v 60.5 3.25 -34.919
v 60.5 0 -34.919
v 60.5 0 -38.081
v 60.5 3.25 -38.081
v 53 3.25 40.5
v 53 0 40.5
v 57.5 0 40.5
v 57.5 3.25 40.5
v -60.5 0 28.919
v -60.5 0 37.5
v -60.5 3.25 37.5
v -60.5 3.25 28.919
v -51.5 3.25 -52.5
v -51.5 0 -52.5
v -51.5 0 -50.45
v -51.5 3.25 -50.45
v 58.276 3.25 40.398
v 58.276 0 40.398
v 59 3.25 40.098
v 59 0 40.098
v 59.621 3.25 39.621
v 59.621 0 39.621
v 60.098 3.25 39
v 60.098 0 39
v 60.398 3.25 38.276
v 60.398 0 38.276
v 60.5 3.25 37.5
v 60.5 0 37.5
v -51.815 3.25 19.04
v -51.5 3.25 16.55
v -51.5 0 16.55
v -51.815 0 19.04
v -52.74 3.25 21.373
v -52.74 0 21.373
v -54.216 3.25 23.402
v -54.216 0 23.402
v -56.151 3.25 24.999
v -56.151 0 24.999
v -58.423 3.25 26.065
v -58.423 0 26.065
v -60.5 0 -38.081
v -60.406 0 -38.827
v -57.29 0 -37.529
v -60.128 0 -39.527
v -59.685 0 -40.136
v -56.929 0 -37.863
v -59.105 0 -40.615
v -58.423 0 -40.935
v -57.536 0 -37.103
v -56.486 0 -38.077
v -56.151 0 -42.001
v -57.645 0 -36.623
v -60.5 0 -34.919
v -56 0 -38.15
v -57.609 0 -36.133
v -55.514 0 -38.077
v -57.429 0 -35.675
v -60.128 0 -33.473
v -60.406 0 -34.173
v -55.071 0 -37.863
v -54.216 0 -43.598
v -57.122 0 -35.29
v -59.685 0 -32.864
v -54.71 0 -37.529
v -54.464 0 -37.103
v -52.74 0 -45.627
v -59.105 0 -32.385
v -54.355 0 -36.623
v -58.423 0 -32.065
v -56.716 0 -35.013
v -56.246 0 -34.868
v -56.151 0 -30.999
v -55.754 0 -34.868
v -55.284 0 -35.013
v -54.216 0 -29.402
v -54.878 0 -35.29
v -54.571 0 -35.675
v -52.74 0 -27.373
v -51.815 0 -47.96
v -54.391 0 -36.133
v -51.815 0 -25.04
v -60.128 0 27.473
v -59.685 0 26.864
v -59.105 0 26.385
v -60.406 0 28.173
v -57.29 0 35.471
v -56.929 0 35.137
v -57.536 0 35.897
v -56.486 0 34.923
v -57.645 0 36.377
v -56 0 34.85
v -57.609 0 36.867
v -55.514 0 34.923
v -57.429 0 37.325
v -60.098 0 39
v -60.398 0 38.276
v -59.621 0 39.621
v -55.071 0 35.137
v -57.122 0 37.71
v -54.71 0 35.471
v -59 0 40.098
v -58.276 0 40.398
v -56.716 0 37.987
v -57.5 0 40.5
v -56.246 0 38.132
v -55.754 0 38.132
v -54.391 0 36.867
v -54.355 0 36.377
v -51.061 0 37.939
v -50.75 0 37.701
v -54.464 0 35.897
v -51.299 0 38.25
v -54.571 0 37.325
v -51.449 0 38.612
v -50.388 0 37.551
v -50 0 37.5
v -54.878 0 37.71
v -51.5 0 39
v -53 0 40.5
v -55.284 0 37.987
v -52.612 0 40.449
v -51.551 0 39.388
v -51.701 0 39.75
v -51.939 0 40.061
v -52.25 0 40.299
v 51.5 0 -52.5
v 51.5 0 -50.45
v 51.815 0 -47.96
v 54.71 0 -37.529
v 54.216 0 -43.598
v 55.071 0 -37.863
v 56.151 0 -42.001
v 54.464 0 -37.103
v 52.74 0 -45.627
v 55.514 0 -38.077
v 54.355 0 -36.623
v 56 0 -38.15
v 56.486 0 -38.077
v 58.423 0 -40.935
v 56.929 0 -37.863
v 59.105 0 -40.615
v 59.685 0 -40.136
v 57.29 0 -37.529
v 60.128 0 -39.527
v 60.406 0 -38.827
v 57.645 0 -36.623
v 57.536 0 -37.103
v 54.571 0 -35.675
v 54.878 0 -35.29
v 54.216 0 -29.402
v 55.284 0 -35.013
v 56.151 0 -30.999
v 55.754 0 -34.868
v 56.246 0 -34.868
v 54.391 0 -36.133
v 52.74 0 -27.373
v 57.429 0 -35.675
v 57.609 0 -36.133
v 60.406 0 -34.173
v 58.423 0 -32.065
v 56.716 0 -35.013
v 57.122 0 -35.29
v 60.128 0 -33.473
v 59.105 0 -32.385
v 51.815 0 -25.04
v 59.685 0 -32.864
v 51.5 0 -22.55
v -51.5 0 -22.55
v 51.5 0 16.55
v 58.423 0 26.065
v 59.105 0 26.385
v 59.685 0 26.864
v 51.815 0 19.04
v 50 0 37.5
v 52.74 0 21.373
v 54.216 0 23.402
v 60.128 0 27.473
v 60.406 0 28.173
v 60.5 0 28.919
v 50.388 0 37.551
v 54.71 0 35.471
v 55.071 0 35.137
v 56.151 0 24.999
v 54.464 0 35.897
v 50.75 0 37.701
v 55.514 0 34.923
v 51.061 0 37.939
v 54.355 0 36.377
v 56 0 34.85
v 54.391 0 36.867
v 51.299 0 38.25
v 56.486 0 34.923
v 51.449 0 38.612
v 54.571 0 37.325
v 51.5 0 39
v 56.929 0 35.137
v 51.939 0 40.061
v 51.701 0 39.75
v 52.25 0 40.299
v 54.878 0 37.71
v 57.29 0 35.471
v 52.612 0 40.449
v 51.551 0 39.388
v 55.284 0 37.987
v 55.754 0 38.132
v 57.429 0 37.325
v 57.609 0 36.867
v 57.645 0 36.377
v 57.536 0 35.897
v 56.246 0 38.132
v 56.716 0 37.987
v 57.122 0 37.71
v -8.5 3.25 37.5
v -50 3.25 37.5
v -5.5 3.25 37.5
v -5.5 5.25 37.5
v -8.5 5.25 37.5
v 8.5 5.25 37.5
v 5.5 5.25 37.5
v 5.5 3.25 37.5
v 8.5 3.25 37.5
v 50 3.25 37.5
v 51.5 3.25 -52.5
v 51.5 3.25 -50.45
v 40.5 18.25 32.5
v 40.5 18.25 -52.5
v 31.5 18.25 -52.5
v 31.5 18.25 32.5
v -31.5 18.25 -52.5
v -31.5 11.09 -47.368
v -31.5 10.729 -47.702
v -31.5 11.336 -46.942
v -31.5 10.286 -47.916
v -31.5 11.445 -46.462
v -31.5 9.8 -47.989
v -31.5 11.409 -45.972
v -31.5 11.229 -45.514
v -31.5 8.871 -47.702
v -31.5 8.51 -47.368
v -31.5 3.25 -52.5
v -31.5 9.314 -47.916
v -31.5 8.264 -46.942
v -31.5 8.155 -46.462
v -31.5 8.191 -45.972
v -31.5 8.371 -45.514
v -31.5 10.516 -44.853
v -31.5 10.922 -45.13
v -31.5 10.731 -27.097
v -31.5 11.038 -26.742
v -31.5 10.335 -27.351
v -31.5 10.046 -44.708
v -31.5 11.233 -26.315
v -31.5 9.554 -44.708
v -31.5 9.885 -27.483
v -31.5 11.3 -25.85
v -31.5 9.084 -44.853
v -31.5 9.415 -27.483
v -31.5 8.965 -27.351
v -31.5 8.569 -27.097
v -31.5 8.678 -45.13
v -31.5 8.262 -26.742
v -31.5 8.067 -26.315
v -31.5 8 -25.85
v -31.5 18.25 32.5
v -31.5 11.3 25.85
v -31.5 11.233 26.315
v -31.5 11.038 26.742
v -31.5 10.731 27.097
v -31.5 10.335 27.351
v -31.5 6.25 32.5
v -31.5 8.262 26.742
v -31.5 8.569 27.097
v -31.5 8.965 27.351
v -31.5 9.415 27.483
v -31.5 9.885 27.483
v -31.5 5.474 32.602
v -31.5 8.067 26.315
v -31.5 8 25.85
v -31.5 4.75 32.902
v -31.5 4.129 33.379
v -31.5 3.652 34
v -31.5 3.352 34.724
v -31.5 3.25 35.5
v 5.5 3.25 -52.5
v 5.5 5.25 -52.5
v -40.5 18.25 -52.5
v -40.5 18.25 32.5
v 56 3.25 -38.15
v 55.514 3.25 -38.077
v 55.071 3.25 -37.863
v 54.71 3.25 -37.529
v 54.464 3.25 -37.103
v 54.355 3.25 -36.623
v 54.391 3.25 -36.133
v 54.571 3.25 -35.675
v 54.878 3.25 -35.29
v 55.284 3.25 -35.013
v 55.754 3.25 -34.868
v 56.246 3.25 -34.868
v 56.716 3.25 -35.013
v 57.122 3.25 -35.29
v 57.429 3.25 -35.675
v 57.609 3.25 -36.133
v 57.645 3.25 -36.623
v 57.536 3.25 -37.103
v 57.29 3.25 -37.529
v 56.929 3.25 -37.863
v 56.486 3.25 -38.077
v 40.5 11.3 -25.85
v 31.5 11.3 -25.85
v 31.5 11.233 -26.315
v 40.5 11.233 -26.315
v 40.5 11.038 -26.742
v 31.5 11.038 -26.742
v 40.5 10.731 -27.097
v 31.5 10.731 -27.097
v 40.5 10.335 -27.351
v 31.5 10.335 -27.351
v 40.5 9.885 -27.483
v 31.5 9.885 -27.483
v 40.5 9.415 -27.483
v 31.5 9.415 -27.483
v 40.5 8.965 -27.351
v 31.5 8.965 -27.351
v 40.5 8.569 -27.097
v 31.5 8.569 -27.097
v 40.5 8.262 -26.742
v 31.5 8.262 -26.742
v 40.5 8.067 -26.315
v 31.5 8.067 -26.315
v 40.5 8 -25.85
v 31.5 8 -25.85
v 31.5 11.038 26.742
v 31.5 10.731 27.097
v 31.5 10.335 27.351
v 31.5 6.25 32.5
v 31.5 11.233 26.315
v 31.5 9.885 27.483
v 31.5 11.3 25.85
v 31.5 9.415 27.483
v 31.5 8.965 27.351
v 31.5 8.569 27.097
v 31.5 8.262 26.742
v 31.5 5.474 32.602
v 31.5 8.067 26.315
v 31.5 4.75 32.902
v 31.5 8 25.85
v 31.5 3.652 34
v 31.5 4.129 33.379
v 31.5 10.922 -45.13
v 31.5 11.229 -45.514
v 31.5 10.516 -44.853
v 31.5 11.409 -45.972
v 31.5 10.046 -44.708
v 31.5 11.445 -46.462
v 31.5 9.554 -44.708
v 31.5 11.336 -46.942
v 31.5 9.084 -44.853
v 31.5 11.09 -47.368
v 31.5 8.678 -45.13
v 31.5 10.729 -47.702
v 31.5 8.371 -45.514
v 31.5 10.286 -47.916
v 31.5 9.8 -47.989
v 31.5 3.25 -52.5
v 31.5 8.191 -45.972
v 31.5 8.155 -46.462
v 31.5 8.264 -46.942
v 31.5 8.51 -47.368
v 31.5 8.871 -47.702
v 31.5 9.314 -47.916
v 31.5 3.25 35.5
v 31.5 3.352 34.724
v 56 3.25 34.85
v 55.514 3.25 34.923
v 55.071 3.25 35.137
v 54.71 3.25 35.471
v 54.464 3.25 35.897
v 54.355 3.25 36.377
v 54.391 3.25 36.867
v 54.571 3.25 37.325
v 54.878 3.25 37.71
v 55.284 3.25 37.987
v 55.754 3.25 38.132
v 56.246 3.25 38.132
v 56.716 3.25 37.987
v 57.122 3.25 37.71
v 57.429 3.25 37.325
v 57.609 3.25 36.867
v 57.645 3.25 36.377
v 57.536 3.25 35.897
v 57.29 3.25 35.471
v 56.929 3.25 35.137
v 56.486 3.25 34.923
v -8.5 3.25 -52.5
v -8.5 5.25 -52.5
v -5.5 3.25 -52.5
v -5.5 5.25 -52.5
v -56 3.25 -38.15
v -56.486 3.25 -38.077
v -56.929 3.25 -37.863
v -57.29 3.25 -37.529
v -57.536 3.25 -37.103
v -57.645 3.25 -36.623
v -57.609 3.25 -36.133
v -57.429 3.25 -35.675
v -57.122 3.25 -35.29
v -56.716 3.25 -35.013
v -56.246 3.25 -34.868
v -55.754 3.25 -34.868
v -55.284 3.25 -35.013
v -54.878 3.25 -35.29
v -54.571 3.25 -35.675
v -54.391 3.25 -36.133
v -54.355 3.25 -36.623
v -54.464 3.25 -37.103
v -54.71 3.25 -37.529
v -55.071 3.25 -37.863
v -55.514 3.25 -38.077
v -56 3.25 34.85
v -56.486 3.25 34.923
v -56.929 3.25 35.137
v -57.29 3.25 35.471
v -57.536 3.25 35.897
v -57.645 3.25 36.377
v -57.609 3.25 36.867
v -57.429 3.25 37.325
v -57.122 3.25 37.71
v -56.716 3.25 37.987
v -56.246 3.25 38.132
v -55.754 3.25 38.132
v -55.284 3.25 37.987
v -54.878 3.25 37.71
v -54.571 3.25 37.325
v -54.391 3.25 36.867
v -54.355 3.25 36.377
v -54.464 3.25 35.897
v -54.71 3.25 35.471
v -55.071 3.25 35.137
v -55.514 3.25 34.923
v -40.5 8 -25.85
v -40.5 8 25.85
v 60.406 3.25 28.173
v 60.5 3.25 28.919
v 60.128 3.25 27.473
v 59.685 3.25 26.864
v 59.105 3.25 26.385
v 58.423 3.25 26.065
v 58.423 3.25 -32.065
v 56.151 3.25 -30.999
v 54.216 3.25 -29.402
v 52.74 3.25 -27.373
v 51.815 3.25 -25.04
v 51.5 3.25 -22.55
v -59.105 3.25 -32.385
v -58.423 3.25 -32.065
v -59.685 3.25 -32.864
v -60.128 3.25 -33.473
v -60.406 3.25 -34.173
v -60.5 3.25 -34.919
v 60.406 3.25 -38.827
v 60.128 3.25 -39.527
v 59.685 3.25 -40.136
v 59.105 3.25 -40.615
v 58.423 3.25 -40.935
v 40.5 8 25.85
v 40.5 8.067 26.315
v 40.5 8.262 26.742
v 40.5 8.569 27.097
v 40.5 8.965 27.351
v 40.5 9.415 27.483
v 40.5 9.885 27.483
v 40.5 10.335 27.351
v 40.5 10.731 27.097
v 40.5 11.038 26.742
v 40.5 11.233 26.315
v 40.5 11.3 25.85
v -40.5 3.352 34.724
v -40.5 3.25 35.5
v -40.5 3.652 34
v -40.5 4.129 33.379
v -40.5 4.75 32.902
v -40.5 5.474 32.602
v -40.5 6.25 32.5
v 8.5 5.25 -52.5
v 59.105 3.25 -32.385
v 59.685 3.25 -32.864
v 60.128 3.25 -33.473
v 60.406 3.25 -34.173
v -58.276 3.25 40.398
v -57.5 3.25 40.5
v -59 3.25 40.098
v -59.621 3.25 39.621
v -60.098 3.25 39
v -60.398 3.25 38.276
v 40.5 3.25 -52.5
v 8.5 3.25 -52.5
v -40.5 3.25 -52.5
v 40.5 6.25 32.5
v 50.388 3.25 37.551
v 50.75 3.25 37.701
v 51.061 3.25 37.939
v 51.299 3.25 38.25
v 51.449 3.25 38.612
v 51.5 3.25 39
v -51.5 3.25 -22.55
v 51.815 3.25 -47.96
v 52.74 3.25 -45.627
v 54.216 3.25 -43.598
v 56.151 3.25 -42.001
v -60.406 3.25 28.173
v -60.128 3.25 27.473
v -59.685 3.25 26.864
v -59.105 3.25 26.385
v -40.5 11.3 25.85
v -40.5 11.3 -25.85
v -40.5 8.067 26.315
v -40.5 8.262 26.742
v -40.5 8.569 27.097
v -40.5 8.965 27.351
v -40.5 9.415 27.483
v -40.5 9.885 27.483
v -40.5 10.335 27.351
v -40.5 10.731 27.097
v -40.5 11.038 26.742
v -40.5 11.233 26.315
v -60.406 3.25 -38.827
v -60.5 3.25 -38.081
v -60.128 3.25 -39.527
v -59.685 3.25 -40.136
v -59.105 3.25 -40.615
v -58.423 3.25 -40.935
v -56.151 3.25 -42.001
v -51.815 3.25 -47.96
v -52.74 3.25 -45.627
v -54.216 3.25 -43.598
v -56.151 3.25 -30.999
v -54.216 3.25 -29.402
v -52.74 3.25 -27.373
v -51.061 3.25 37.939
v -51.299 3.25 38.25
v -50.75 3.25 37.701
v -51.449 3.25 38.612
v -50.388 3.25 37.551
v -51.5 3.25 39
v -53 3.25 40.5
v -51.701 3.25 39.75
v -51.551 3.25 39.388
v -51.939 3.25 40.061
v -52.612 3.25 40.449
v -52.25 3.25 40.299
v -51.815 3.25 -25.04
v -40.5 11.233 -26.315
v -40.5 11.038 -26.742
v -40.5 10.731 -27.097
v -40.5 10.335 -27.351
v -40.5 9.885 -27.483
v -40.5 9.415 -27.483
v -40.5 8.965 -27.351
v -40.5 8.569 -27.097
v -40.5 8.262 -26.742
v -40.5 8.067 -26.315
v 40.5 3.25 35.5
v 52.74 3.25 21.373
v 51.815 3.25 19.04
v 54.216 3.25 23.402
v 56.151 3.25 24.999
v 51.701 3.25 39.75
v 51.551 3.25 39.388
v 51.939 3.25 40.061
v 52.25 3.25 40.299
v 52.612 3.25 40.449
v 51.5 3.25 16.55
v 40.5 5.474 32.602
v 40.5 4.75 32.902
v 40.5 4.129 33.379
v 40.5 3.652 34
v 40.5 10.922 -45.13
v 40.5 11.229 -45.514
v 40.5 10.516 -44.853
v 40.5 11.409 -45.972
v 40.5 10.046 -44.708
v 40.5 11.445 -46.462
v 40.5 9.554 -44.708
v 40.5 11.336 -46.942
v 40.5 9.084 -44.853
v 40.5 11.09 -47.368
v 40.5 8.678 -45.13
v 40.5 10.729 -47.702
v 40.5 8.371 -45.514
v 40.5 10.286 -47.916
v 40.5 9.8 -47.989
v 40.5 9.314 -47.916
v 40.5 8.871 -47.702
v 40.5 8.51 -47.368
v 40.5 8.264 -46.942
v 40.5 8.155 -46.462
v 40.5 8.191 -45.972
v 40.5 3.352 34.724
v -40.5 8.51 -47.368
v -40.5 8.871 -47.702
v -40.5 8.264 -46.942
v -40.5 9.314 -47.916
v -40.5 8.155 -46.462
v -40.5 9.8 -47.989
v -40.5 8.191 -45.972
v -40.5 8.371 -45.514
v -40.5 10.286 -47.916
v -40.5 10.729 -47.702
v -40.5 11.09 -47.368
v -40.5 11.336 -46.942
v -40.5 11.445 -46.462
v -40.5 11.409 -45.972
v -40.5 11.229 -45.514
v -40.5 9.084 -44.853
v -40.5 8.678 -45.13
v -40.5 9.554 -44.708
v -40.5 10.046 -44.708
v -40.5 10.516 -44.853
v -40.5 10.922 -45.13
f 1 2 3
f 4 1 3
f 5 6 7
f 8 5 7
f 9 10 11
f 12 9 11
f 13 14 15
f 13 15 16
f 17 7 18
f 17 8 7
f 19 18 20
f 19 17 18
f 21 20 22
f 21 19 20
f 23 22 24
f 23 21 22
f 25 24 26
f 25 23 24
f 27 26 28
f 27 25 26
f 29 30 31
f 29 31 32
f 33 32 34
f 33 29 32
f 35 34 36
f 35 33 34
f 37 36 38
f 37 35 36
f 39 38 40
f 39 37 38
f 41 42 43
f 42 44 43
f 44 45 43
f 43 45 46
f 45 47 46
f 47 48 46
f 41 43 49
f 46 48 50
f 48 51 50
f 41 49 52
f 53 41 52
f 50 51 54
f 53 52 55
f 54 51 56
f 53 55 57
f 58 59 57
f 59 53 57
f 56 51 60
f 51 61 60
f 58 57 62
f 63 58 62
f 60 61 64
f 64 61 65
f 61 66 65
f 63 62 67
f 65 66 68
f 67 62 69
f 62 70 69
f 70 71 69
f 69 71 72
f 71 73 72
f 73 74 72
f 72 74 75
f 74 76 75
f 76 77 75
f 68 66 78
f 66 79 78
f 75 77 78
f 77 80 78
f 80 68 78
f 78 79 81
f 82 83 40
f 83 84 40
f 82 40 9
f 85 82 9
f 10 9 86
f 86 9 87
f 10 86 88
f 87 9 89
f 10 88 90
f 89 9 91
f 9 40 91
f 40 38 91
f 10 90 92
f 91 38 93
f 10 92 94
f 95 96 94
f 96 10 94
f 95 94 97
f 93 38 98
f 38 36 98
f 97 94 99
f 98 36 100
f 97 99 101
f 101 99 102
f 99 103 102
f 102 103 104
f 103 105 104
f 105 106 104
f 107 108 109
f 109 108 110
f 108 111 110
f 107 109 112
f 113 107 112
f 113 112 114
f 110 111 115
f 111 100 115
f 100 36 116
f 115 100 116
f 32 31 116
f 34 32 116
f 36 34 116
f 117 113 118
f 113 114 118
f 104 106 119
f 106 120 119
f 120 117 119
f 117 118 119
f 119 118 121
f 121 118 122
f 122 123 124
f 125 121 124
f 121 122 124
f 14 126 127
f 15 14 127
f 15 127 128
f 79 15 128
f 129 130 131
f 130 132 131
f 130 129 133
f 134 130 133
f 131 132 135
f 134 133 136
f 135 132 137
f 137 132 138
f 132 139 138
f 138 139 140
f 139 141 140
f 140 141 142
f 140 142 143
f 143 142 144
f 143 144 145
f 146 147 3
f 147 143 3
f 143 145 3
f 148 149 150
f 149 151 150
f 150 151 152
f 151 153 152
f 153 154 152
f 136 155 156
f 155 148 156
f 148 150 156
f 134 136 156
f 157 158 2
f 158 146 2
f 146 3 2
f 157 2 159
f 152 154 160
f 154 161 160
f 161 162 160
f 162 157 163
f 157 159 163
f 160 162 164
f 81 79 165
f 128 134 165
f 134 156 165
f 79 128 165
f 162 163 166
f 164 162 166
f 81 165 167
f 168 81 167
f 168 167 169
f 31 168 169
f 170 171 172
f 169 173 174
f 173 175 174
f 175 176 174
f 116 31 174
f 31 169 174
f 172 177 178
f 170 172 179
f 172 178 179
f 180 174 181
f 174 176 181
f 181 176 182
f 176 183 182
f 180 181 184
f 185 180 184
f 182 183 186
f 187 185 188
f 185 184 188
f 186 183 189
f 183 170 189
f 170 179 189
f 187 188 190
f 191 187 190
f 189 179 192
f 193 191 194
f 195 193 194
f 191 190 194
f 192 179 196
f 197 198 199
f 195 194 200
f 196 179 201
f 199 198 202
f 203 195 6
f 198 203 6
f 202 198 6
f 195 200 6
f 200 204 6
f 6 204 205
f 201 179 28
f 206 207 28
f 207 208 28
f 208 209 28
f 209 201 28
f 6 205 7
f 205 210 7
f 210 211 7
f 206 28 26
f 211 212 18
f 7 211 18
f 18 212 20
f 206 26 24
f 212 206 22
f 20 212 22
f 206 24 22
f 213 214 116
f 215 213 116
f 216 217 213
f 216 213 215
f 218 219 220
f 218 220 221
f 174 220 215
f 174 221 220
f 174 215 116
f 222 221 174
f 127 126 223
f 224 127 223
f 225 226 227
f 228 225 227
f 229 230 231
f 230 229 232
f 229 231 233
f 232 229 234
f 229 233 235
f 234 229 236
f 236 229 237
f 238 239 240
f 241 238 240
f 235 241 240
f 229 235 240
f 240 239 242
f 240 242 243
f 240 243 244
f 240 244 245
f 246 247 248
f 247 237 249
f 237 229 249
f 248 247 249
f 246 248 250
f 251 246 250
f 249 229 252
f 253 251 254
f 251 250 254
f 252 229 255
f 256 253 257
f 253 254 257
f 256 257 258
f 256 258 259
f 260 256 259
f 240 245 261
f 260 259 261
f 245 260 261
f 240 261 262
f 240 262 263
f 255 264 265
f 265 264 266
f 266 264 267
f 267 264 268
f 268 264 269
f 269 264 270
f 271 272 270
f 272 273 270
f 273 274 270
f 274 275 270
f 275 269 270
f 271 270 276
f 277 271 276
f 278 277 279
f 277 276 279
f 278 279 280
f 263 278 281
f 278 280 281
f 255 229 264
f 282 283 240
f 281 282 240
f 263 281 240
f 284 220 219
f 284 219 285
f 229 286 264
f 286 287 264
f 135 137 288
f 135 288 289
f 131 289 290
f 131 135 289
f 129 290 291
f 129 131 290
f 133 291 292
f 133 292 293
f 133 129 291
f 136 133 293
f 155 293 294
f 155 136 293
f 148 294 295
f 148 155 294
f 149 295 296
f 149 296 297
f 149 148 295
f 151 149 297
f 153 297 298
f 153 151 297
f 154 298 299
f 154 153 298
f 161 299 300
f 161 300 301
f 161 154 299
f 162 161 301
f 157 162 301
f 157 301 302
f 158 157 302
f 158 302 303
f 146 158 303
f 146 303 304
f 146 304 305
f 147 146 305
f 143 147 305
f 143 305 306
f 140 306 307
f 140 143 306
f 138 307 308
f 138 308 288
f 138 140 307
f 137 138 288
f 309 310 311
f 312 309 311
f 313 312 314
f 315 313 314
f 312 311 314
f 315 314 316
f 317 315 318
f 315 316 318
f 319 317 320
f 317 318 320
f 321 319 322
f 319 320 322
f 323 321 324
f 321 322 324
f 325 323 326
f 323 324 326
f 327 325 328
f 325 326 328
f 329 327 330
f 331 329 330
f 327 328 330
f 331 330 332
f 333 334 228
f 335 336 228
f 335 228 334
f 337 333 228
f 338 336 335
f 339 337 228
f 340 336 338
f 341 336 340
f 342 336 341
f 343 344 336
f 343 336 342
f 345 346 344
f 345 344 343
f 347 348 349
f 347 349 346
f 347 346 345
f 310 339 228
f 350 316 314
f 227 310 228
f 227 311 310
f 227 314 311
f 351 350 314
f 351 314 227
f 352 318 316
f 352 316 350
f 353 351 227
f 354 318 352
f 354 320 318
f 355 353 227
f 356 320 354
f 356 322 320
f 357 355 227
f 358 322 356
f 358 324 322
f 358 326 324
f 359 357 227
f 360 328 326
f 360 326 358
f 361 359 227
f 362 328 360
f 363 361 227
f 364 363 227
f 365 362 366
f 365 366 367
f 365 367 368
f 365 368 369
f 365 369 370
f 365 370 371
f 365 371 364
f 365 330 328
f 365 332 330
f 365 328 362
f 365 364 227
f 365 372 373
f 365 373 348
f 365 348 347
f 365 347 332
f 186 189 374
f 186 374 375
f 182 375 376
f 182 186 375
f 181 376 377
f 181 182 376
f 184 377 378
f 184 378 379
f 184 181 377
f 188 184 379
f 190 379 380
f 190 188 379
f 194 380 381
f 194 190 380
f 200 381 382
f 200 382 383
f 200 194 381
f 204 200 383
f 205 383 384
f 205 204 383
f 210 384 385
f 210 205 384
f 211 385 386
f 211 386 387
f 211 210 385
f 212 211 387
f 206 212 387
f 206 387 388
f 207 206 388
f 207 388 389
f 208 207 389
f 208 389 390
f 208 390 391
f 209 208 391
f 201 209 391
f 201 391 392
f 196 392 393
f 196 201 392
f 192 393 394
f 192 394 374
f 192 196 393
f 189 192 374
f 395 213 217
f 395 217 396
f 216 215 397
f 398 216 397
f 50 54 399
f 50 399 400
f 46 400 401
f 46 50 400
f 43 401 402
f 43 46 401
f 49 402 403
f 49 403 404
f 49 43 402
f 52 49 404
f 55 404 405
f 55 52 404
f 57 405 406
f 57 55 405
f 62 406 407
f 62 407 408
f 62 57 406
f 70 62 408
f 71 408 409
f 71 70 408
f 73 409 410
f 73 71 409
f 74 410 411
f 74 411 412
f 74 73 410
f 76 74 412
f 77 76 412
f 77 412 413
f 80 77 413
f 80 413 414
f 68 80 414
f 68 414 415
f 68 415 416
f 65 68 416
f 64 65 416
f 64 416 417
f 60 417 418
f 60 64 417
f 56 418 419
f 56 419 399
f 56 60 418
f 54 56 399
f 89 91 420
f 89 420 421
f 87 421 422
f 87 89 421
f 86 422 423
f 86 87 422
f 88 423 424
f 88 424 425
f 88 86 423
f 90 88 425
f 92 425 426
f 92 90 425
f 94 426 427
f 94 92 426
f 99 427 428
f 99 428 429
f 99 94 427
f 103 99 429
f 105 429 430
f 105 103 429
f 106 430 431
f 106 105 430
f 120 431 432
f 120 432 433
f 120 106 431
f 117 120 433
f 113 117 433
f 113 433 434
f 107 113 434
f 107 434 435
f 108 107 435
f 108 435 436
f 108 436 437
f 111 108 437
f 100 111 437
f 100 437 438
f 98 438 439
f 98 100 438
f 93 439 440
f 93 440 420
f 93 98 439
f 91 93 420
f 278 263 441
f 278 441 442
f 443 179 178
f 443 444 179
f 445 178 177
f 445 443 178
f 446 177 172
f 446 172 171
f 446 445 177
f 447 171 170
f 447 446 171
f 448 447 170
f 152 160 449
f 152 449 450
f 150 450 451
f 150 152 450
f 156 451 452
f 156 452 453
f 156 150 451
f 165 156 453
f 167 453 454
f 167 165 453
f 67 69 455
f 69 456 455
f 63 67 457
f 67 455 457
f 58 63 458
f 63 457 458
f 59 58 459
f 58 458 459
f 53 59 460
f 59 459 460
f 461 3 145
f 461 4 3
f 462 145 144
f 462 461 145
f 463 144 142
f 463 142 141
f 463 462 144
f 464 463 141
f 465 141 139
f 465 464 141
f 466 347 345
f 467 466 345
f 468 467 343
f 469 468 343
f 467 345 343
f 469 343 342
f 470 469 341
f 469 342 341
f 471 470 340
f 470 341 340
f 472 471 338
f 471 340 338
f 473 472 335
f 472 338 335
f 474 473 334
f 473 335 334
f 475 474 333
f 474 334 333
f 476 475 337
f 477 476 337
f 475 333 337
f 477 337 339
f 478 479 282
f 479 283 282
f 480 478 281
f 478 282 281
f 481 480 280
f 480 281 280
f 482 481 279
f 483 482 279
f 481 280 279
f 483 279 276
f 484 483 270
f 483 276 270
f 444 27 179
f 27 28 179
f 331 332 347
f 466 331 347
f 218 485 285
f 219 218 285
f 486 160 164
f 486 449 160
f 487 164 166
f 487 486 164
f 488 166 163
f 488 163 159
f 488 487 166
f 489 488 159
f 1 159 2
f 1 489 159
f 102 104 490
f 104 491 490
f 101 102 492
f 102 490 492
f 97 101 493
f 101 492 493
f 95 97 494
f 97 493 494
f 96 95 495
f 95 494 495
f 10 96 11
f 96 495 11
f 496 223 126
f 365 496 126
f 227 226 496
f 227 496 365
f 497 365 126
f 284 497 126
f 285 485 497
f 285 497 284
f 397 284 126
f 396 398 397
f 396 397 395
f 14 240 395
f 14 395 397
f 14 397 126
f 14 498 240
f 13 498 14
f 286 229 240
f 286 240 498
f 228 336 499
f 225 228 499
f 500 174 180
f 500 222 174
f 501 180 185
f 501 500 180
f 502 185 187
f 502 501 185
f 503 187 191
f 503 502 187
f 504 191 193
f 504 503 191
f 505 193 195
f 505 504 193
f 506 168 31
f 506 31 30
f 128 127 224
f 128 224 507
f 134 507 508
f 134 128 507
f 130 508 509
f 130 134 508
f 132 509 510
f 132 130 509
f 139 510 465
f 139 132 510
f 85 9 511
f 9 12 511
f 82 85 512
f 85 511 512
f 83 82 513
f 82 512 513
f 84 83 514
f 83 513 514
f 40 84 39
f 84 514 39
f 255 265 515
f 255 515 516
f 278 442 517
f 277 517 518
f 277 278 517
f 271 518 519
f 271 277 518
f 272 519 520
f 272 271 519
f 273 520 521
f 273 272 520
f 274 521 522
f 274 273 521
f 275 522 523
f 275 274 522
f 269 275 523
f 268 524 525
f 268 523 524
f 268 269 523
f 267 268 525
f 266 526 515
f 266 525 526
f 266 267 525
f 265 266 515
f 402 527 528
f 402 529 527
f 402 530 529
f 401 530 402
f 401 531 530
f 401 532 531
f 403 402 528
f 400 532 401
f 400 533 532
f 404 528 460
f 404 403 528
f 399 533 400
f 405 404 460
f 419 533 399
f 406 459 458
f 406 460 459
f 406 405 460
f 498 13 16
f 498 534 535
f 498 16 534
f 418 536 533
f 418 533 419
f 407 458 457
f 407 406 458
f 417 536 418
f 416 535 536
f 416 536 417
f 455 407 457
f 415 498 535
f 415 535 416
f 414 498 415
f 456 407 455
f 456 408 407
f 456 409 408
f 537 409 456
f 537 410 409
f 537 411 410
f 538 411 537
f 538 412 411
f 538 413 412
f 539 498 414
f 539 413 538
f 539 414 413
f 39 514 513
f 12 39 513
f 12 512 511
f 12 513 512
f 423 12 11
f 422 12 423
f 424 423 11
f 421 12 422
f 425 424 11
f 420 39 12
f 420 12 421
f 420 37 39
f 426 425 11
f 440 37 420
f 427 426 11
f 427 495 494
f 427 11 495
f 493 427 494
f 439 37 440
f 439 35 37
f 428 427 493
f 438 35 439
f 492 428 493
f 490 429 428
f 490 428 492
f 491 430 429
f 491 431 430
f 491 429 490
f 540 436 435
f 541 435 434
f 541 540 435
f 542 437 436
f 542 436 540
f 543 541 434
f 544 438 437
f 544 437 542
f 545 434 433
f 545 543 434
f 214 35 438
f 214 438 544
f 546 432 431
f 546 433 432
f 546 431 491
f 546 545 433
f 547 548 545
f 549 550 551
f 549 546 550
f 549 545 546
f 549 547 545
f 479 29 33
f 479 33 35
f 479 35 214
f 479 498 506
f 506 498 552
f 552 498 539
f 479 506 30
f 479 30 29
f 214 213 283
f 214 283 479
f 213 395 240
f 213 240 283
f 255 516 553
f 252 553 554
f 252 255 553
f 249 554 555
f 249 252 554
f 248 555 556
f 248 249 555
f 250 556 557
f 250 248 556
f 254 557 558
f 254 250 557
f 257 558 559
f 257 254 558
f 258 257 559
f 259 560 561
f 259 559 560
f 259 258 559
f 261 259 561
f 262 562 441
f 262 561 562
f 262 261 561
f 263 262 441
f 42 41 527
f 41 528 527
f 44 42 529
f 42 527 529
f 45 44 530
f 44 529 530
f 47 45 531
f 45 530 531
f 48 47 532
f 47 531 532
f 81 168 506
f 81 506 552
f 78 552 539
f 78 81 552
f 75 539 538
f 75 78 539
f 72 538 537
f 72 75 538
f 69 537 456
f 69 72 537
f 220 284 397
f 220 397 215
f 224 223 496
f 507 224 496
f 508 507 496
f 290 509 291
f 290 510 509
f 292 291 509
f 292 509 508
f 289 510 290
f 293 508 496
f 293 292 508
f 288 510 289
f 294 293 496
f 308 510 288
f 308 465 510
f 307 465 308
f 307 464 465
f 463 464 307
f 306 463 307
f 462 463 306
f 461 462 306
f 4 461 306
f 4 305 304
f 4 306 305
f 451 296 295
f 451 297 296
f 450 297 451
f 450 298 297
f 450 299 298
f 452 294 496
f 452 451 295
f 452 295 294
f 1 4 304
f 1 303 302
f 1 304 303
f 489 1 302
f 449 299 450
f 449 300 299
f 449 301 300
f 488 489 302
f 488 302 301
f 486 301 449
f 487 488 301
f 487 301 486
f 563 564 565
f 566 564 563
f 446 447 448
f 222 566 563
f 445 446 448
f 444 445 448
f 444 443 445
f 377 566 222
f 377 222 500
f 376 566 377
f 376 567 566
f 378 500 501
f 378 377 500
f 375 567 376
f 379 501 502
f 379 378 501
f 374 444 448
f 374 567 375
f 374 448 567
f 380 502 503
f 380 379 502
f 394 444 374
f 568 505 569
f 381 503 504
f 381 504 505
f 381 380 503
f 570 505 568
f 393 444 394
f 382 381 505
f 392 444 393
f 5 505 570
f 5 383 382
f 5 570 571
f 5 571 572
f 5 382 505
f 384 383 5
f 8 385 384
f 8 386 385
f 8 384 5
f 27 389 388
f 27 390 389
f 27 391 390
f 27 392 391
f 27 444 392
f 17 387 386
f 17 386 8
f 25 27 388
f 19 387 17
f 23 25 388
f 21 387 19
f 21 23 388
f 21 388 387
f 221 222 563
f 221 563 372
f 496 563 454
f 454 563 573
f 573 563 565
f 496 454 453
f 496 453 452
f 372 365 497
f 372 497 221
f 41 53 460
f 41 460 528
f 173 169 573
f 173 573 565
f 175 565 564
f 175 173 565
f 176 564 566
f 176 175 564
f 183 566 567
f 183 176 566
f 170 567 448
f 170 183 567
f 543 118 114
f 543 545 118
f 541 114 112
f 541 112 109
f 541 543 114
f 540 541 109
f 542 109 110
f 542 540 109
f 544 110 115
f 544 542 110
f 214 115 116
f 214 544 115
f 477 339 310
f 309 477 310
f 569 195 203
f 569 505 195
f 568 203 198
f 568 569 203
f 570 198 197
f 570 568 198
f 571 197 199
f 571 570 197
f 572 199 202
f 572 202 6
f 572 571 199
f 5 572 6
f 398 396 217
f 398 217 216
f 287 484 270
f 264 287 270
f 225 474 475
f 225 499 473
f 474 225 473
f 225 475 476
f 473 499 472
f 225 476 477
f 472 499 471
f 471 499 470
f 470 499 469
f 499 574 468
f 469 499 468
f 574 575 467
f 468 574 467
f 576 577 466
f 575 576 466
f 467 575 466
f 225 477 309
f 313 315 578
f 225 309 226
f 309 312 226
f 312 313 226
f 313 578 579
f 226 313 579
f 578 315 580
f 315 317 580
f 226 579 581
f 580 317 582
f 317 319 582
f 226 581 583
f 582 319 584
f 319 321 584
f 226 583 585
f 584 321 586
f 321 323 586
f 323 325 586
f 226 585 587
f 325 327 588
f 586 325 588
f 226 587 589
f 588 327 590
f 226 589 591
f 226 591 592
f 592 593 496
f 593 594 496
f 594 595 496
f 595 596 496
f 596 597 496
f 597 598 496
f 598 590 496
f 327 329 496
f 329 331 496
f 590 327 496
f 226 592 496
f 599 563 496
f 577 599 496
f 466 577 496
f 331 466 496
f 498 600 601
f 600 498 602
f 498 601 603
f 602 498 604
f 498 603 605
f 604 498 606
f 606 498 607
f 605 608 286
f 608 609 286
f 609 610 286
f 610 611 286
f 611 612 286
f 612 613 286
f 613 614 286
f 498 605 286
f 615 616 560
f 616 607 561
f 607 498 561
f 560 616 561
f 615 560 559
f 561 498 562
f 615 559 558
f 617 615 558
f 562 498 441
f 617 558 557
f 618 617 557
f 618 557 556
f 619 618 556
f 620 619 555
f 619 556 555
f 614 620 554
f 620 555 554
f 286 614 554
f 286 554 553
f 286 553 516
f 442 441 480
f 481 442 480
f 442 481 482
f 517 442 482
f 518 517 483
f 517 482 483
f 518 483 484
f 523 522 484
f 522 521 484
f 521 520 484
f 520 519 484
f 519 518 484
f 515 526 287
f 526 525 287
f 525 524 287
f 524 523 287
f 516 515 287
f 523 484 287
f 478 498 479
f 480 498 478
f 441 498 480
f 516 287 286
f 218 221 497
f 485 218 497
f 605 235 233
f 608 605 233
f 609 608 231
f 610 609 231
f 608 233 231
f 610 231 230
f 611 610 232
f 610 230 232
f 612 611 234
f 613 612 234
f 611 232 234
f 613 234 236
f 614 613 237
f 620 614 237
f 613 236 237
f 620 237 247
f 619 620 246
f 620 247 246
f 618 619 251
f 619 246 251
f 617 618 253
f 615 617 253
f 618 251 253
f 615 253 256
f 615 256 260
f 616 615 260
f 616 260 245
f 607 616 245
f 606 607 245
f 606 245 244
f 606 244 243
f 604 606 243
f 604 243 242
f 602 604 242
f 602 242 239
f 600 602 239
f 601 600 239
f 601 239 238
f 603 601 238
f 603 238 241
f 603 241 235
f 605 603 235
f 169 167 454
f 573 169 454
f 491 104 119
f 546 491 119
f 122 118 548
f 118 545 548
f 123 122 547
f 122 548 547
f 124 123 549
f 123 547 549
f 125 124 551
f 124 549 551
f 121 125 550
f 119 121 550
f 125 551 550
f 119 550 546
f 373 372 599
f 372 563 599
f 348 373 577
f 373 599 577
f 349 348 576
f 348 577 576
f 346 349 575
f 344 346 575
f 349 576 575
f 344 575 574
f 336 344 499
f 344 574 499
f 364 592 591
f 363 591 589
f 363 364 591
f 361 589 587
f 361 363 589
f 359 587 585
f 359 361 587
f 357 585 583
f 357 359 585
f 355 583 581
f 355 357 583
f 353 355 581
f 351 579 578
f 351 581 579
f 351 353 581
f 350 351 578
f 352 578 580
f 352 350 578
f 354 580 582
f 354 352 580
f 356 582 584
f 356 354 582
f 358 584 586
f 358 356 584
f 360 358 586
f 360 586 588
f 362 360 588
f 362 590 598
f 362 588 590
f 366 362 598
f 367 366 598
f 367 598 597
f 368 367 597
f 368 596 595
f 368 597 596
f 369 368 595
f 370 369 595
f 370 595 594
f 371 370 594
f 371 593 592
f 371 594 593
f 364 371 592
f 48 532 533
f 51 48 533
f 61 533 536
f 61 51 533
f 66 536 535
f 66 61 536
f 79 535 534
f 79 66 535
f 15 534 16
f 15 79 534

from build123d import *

# Parameters (mm, degrees)
SKETCH1_W            = 103
SKETCH1_H            = 65
BOSS_EXTRUDE1_DEPTH  = 3.25
SKETCH2_W            = 9
SKETCH2_H            = 65
BOSS_EXTRUDE2_DEPTH  = 15
CUT_EXTRUDE1_DEPTH   = 91.985232318
BOSS_EXTRUDE3_DEPTH  = 20
SKETCH5_R            = 1.65
CUT_EXTRUDE2_DEPTH   = 100.891503643
SKETCH11_W           = 103
SKETCH11_H           = 3.25
BOSS_EXTRUDE8_DEPTH  = 5
SKETCH12_W           = 9
SKETCH12_H           = 8
SKETCH12_R           = 1.65
BOSS_EXTRUDE9_DEPTH  = 3.25
SKETCH15_W           = 9
SKETCH15_H           = 3.25
BOSS_EXTRUDE10_DEPTH = 6
FILLET1_R            = 10
FILLET2_R            = 1.5
FILLET3_R            = 3
FILLET4_R            = 3
SKETCH16_W           = 3
SKETCH16_H           = 90
BOSS_EXTRUDE11_DEPTH = 2


# Some blends are built 0.0001 mm under size
with BuildPart() as part:
    # Sketch1 → Boss-Extrude1 (new body)
    with BuildSketch(Plane(origin=(0, 0, 0), x_dir=(1, 0, 0), z_dir=(0, 1, 0))):
        Rectangle(SKETCH1_W, SKETCH1_H)
    extrude(amount=BOSS_EXTRUDE1_DEPTH)

    # Sketch2 → Boss-Extrude2 (add)
    with BuildSketch(Plane(origin=(0, 3.25, 0), x_dir=(1, 0, 0), z_dir=(0, 1, 0))):
        with Locations((-36, 0)):
            Rectangle(SKETCH2_W, SKETCH2_H)
    boss_extrude2 = extrude(amount=BOSS_EXTRUDE2_DEPTH)

    # Sketch3 → Cut-Extrude1 (cut, through all)
    with BuildSketch(Plane(origin=(-31.5, 0, 0), x_dir=(0, 0, -1), z_dir=(1, 0, 0))):
        with BuildLine():
            Line((25.85, 8), (-25.85, 8))
            ThreePointArc((-25.85, 8), (-27.5, 9.65), (-25.85, 11.3))
            Line((-25.85, 11.3), (25.85, 11.3))
            ThreePointArc((25.85, 11.3), (27.5, 9.65), (25.85, 8))
        make_face()
    cut_extrude1 = extrude(amount=-CUT_EXTRUDE1_DEPTH, mode=Mode.SUBTRACT)

    # Sketch4 → Boss-Extrude3 (add)
    with BuildSketch(Plane(origin=(0, 0, -32.5), x_dir=(-1, 0, 0), z_dir=(0, 0, -1))):
        Polygon((51.5, 3.25), (40.5, 3.25), (40.5, 18.25), (31.5, 18.25), (31.5, 3.25), (-51.5, 3.25), (-51.5, 0), (51.5, 0), align=None)
    boss_extrude3 = extrude(amount=BOSS_EXTRUDE3_DEPTH)

    # Sketch5 → Cut-Extrude2 (cut, through all)
    with BuildSketch(Plane(origin=(-31.5, 0, 0), x_dir=(0, 0, -1), z_dir=(1, 0, 0))):
        with Locations((46.339135755, 9.8)):
            Circle(SKETCH5_R)
    cut_extrude2 = extrude(amount=-CUT_EXTRUDE2_DEPTH, mode=Mode.SUBTRACT)

    # Mirror1: Boss-Extrude2, Cut-Extrude1, Boss-Extrude3, Cut-Extrude2 across plane
    add(boss_extrude2.mirror(Plane(origin=(0, 0, 0), x_dir=(0, 0, 1), z_dir=(1, 0, 0))))
    add(cut_extrude1.mirror(Plane(origin=(0, 0, 0), x_dir=(0, 0, 1), z_dir=(1, 0, 0))), mode=Mode.SUBTRACT)
    add(boss_extrude3.mirror(Plane(origin=(0, 0, 0), x_dir=(0, 0, 1), z_dir=(1, 0, 0))))
    add(cut_extrude2.mirror(Plane(origin=(0, 0, 0), x_dir=(0, 0, 1), z_dir=(1, 0, 0))), mode=Mode.SUBTRACT)

    # Sketch11 → Boss-Extrude8 (add)
    with BuildSketch(Plane.XY.offset(32.5)):
        with Locations((0, 1.625)):
            Rectangle(SKETCH11_W, SKETCH11_H)
    extrude(amount=BOSS_EXTRUDE8_DEPTH)

    # Sketch12 → Boss-Extrude9 (add)
    # profile 1 of 4: a face of its own
    with BuildSketch(Plane(origin=(0, 0, 0), x_dir=(1, 0, 0), z_dir=(0, 1, 0))):
        with Locations((56, -36.5)):
            Rectangle(SKETCH12_W, SKETCH12_H)
        with Locations(Location((56, -36.5, 0), (0, 0, 90))):
            Circle(SKETCH12_R, mode=Mode.SUBTRACT)
    # profile 2 of 4: a face of its own
    with BuildSketch(Plane(origin=(0, 0, 0), x_dir=(1, 0, 0), z_dir=(0, 1, 0))):
        with Locations((56, 36.5)):
            Rectangle(SKETCH12_W, SKETCH12_H)
        with Locations(Location((56, 36.5, 0), (0, 0, 90))):
            Circle(SKETCH12_R, mode=Mode.SUBTRACT)
    # profile 3 of 4: a face of its own
    with BuildSketch(Plane(origin=(0, 0, 0), x_dir=(1, 0, 0), z_dir=(0, 1, 0))):
        with Locations((-56, 36.5)):
            Rectangle(SKETCH12_W, SKETCH12_H)
        with Locations(Location((-56, 36.5, 0), (0, 0, 90))):
            Circle(SKETCH12_R, mode=Mode.SUBTRACT)
    # profile 4 of 4: a face of its own
    with BuildSketch(Plane(origin=(0, 0, 0), x_dir=(1, 0, 0), z_dir=(0, 1, 0))):
        with Locations((-56, -36.5)):
            Rectangle(SKETCH12_W, SKETCH12_H)
        with Locations(Location((-56, -36.5, 0), (0, 0, 90))):
            Circle(SKETCH12_R, mode=Mode.SUBTRACT)
    extrude(amount=BOSS_EXTRUDE9_DEPTH)

    # Sketch15 → Boss-Extrude10 (add)
    with BuildSketch(Plane(origin=(0, 0, 32.5), x_dir=(-1, 0, 0), z_dir=(0, 0, -1))):
        with Locations((56, 1.625)):
            Rectangle(SKETCH15_W, SKETCH15_H)
        with Locations((-56, 1.625)):
            Rectangle(SKETCH15_W, SKETCH15_H)
    extrude(amount=BOSS_EXTRUDE10_DEPTH)

    # Fillet1
    # the kernel refuses this fillet: 10 mm, written as the material it adds along each edge
    with BuildSketch(Plane(origin=(51.5, 0, 26.5), x_dir=(1, 0, 0), z_dir=(0, 1, 0)), Plane(origin=(51.5, 0, -40.5), x_dir=(1, 0, 0), z_dir=(0, 1, 0)), Plane(origin=(-51.5, 0, -32.5), x_dir=(-1, 0, 0), z_dir=(0, 1, 0))) as fillet1_piece_1:
        with BuildLine():
            CenterArc((10, 9.949874371), FILLET1_R, 180, 84.260829523)
            Line((0, 9.949874371), (-0.2, 9.949874371))
            Line((-0.2, 9.949874371), (-0.2, 0))
            Line((-0.2, 0), (0, -0.2))
            ThreePointArc((0, -0.2), (4.5, -0.2), (8.98, -0.198997487))
            Line((8.98, -0.198997487), (9, 0))
        make_face()
    extrude(amount=3.25)
    with BuildSketch(Plane(origin=(51.5, 0, -32.5), x_dir=(0, 0, 1), z_dir=(0, 1, 0)), Plane(origin=(-51.5, 0, -40.5), x_dir=(0, 0, -1), z_dir=(0, 1, 0))) as fillet1_piece_2:
        with BuildLine():
            CenterArc((9.949874371, 10), FILLET1_R, 185.739170477, 84.260829523)
            Line((0, 9), (-0.198997487, 8.98))
            ThreePointArc((-0.198997487, 8.98), (-0.2, 4.5), (-0.2, 0))
            Line((-0.2, 0), (0, -0.2))
            Line((0, -0.2), (9.949874371, -0.2))
            Line((9.949874371, -0.2), (9.949874371, 0))
        make_face()
    extrude(amount=3.25)
    with BuildSketch(Plane(origin=(-51.5, 3.25, 26.5), x_dir=(0, 0, -1), z_dir=(0, -1, 0))) as fillet1_piece_3:
        with BuildLine():
            CenterArc((9.949874371, -10), FILLET1_R, 90, 84.260829523)
            Line((0, -9), (-0.198997487, -8.98))
            ThreePointArc((-0.198997487, -8.98), (-0.2, -4.5), (-0.2, 0))
            Line((-0.2, 0), (0, 0.2))
            Line((0, 0.2), (9.949874371, 0.2))
            Line((9.949874371, 0.2), (9.949874371, 0))
        make_face()
    extrude(amount=3.25)

    # Fillet2
    fillet2_edges = [part.edges().sort_by_distance(p)[0] for p in [
        (-51.5, 1.625, 37.5),
        (51.5, 1.625, 37.5),
    ]]
    fillet(fillet2_edges, radius=FILLET2_R)
    fillet2_2_edges = [part.edges().sort_by_distance(p)[0] for p in [
        (-51.5, 1.625, 40.5),
        (51.5, 1.625, 40.5),
    ]]
    fillet(fillet2_2_edges, radius=FILLET2_R - 0.0001)  # a hair under: the kernel refuses the full size

    # Fillet3
    fillet3_edges = [part.edges().sort_by_distance(p)[0] for p in [
        (-60.5, 1.625, 40.5),
        (-60.5, 1.625, -40.5),
        (-60.5, 1.625, -32.5),
        (60.5, 1.625, -40.5),
        (60.5, 1.625, -32.5),
        (60.5, 1.625, 40.5),
        (-60.5, 1.625, 26.5),
        (60.5, 1.625, 26.5),
    ]]
    fillet(fillet3_edges, radius=FILLET3_R)

    # Fillet4
    fillet4_edges = [part.edges().sort_by_distance(p)[0] for p in [
        (-36, 3.25, 32.5),
        (36, 3.25, 32.5),
    ]]
    fillet(fillet4_edges, radius=FILLET4_R)

    # Sketch16 → Boss-Extrude11 (add)
    with BuildSketch(Plane(origin=(0, 3.25, 0), x_dir=(1, 0, 0), z_dir=(0, 1, 0))):
        with Locations((-7, 7.5)):
            Rectangle(SKETCH16_W, SKETCH16_H)
    boss_extrude11 = extrude(amount=BOSS_EXTRUDE11_DEPTH)

    # Mirror2: Boss-Extrude11 across plane
    add(boss_extrude11.mirror(Plane(origin=(0, 0, 0), x_dir=(0, 0, 1), z_dir=(1, 0, 0))))


solid = part.part
